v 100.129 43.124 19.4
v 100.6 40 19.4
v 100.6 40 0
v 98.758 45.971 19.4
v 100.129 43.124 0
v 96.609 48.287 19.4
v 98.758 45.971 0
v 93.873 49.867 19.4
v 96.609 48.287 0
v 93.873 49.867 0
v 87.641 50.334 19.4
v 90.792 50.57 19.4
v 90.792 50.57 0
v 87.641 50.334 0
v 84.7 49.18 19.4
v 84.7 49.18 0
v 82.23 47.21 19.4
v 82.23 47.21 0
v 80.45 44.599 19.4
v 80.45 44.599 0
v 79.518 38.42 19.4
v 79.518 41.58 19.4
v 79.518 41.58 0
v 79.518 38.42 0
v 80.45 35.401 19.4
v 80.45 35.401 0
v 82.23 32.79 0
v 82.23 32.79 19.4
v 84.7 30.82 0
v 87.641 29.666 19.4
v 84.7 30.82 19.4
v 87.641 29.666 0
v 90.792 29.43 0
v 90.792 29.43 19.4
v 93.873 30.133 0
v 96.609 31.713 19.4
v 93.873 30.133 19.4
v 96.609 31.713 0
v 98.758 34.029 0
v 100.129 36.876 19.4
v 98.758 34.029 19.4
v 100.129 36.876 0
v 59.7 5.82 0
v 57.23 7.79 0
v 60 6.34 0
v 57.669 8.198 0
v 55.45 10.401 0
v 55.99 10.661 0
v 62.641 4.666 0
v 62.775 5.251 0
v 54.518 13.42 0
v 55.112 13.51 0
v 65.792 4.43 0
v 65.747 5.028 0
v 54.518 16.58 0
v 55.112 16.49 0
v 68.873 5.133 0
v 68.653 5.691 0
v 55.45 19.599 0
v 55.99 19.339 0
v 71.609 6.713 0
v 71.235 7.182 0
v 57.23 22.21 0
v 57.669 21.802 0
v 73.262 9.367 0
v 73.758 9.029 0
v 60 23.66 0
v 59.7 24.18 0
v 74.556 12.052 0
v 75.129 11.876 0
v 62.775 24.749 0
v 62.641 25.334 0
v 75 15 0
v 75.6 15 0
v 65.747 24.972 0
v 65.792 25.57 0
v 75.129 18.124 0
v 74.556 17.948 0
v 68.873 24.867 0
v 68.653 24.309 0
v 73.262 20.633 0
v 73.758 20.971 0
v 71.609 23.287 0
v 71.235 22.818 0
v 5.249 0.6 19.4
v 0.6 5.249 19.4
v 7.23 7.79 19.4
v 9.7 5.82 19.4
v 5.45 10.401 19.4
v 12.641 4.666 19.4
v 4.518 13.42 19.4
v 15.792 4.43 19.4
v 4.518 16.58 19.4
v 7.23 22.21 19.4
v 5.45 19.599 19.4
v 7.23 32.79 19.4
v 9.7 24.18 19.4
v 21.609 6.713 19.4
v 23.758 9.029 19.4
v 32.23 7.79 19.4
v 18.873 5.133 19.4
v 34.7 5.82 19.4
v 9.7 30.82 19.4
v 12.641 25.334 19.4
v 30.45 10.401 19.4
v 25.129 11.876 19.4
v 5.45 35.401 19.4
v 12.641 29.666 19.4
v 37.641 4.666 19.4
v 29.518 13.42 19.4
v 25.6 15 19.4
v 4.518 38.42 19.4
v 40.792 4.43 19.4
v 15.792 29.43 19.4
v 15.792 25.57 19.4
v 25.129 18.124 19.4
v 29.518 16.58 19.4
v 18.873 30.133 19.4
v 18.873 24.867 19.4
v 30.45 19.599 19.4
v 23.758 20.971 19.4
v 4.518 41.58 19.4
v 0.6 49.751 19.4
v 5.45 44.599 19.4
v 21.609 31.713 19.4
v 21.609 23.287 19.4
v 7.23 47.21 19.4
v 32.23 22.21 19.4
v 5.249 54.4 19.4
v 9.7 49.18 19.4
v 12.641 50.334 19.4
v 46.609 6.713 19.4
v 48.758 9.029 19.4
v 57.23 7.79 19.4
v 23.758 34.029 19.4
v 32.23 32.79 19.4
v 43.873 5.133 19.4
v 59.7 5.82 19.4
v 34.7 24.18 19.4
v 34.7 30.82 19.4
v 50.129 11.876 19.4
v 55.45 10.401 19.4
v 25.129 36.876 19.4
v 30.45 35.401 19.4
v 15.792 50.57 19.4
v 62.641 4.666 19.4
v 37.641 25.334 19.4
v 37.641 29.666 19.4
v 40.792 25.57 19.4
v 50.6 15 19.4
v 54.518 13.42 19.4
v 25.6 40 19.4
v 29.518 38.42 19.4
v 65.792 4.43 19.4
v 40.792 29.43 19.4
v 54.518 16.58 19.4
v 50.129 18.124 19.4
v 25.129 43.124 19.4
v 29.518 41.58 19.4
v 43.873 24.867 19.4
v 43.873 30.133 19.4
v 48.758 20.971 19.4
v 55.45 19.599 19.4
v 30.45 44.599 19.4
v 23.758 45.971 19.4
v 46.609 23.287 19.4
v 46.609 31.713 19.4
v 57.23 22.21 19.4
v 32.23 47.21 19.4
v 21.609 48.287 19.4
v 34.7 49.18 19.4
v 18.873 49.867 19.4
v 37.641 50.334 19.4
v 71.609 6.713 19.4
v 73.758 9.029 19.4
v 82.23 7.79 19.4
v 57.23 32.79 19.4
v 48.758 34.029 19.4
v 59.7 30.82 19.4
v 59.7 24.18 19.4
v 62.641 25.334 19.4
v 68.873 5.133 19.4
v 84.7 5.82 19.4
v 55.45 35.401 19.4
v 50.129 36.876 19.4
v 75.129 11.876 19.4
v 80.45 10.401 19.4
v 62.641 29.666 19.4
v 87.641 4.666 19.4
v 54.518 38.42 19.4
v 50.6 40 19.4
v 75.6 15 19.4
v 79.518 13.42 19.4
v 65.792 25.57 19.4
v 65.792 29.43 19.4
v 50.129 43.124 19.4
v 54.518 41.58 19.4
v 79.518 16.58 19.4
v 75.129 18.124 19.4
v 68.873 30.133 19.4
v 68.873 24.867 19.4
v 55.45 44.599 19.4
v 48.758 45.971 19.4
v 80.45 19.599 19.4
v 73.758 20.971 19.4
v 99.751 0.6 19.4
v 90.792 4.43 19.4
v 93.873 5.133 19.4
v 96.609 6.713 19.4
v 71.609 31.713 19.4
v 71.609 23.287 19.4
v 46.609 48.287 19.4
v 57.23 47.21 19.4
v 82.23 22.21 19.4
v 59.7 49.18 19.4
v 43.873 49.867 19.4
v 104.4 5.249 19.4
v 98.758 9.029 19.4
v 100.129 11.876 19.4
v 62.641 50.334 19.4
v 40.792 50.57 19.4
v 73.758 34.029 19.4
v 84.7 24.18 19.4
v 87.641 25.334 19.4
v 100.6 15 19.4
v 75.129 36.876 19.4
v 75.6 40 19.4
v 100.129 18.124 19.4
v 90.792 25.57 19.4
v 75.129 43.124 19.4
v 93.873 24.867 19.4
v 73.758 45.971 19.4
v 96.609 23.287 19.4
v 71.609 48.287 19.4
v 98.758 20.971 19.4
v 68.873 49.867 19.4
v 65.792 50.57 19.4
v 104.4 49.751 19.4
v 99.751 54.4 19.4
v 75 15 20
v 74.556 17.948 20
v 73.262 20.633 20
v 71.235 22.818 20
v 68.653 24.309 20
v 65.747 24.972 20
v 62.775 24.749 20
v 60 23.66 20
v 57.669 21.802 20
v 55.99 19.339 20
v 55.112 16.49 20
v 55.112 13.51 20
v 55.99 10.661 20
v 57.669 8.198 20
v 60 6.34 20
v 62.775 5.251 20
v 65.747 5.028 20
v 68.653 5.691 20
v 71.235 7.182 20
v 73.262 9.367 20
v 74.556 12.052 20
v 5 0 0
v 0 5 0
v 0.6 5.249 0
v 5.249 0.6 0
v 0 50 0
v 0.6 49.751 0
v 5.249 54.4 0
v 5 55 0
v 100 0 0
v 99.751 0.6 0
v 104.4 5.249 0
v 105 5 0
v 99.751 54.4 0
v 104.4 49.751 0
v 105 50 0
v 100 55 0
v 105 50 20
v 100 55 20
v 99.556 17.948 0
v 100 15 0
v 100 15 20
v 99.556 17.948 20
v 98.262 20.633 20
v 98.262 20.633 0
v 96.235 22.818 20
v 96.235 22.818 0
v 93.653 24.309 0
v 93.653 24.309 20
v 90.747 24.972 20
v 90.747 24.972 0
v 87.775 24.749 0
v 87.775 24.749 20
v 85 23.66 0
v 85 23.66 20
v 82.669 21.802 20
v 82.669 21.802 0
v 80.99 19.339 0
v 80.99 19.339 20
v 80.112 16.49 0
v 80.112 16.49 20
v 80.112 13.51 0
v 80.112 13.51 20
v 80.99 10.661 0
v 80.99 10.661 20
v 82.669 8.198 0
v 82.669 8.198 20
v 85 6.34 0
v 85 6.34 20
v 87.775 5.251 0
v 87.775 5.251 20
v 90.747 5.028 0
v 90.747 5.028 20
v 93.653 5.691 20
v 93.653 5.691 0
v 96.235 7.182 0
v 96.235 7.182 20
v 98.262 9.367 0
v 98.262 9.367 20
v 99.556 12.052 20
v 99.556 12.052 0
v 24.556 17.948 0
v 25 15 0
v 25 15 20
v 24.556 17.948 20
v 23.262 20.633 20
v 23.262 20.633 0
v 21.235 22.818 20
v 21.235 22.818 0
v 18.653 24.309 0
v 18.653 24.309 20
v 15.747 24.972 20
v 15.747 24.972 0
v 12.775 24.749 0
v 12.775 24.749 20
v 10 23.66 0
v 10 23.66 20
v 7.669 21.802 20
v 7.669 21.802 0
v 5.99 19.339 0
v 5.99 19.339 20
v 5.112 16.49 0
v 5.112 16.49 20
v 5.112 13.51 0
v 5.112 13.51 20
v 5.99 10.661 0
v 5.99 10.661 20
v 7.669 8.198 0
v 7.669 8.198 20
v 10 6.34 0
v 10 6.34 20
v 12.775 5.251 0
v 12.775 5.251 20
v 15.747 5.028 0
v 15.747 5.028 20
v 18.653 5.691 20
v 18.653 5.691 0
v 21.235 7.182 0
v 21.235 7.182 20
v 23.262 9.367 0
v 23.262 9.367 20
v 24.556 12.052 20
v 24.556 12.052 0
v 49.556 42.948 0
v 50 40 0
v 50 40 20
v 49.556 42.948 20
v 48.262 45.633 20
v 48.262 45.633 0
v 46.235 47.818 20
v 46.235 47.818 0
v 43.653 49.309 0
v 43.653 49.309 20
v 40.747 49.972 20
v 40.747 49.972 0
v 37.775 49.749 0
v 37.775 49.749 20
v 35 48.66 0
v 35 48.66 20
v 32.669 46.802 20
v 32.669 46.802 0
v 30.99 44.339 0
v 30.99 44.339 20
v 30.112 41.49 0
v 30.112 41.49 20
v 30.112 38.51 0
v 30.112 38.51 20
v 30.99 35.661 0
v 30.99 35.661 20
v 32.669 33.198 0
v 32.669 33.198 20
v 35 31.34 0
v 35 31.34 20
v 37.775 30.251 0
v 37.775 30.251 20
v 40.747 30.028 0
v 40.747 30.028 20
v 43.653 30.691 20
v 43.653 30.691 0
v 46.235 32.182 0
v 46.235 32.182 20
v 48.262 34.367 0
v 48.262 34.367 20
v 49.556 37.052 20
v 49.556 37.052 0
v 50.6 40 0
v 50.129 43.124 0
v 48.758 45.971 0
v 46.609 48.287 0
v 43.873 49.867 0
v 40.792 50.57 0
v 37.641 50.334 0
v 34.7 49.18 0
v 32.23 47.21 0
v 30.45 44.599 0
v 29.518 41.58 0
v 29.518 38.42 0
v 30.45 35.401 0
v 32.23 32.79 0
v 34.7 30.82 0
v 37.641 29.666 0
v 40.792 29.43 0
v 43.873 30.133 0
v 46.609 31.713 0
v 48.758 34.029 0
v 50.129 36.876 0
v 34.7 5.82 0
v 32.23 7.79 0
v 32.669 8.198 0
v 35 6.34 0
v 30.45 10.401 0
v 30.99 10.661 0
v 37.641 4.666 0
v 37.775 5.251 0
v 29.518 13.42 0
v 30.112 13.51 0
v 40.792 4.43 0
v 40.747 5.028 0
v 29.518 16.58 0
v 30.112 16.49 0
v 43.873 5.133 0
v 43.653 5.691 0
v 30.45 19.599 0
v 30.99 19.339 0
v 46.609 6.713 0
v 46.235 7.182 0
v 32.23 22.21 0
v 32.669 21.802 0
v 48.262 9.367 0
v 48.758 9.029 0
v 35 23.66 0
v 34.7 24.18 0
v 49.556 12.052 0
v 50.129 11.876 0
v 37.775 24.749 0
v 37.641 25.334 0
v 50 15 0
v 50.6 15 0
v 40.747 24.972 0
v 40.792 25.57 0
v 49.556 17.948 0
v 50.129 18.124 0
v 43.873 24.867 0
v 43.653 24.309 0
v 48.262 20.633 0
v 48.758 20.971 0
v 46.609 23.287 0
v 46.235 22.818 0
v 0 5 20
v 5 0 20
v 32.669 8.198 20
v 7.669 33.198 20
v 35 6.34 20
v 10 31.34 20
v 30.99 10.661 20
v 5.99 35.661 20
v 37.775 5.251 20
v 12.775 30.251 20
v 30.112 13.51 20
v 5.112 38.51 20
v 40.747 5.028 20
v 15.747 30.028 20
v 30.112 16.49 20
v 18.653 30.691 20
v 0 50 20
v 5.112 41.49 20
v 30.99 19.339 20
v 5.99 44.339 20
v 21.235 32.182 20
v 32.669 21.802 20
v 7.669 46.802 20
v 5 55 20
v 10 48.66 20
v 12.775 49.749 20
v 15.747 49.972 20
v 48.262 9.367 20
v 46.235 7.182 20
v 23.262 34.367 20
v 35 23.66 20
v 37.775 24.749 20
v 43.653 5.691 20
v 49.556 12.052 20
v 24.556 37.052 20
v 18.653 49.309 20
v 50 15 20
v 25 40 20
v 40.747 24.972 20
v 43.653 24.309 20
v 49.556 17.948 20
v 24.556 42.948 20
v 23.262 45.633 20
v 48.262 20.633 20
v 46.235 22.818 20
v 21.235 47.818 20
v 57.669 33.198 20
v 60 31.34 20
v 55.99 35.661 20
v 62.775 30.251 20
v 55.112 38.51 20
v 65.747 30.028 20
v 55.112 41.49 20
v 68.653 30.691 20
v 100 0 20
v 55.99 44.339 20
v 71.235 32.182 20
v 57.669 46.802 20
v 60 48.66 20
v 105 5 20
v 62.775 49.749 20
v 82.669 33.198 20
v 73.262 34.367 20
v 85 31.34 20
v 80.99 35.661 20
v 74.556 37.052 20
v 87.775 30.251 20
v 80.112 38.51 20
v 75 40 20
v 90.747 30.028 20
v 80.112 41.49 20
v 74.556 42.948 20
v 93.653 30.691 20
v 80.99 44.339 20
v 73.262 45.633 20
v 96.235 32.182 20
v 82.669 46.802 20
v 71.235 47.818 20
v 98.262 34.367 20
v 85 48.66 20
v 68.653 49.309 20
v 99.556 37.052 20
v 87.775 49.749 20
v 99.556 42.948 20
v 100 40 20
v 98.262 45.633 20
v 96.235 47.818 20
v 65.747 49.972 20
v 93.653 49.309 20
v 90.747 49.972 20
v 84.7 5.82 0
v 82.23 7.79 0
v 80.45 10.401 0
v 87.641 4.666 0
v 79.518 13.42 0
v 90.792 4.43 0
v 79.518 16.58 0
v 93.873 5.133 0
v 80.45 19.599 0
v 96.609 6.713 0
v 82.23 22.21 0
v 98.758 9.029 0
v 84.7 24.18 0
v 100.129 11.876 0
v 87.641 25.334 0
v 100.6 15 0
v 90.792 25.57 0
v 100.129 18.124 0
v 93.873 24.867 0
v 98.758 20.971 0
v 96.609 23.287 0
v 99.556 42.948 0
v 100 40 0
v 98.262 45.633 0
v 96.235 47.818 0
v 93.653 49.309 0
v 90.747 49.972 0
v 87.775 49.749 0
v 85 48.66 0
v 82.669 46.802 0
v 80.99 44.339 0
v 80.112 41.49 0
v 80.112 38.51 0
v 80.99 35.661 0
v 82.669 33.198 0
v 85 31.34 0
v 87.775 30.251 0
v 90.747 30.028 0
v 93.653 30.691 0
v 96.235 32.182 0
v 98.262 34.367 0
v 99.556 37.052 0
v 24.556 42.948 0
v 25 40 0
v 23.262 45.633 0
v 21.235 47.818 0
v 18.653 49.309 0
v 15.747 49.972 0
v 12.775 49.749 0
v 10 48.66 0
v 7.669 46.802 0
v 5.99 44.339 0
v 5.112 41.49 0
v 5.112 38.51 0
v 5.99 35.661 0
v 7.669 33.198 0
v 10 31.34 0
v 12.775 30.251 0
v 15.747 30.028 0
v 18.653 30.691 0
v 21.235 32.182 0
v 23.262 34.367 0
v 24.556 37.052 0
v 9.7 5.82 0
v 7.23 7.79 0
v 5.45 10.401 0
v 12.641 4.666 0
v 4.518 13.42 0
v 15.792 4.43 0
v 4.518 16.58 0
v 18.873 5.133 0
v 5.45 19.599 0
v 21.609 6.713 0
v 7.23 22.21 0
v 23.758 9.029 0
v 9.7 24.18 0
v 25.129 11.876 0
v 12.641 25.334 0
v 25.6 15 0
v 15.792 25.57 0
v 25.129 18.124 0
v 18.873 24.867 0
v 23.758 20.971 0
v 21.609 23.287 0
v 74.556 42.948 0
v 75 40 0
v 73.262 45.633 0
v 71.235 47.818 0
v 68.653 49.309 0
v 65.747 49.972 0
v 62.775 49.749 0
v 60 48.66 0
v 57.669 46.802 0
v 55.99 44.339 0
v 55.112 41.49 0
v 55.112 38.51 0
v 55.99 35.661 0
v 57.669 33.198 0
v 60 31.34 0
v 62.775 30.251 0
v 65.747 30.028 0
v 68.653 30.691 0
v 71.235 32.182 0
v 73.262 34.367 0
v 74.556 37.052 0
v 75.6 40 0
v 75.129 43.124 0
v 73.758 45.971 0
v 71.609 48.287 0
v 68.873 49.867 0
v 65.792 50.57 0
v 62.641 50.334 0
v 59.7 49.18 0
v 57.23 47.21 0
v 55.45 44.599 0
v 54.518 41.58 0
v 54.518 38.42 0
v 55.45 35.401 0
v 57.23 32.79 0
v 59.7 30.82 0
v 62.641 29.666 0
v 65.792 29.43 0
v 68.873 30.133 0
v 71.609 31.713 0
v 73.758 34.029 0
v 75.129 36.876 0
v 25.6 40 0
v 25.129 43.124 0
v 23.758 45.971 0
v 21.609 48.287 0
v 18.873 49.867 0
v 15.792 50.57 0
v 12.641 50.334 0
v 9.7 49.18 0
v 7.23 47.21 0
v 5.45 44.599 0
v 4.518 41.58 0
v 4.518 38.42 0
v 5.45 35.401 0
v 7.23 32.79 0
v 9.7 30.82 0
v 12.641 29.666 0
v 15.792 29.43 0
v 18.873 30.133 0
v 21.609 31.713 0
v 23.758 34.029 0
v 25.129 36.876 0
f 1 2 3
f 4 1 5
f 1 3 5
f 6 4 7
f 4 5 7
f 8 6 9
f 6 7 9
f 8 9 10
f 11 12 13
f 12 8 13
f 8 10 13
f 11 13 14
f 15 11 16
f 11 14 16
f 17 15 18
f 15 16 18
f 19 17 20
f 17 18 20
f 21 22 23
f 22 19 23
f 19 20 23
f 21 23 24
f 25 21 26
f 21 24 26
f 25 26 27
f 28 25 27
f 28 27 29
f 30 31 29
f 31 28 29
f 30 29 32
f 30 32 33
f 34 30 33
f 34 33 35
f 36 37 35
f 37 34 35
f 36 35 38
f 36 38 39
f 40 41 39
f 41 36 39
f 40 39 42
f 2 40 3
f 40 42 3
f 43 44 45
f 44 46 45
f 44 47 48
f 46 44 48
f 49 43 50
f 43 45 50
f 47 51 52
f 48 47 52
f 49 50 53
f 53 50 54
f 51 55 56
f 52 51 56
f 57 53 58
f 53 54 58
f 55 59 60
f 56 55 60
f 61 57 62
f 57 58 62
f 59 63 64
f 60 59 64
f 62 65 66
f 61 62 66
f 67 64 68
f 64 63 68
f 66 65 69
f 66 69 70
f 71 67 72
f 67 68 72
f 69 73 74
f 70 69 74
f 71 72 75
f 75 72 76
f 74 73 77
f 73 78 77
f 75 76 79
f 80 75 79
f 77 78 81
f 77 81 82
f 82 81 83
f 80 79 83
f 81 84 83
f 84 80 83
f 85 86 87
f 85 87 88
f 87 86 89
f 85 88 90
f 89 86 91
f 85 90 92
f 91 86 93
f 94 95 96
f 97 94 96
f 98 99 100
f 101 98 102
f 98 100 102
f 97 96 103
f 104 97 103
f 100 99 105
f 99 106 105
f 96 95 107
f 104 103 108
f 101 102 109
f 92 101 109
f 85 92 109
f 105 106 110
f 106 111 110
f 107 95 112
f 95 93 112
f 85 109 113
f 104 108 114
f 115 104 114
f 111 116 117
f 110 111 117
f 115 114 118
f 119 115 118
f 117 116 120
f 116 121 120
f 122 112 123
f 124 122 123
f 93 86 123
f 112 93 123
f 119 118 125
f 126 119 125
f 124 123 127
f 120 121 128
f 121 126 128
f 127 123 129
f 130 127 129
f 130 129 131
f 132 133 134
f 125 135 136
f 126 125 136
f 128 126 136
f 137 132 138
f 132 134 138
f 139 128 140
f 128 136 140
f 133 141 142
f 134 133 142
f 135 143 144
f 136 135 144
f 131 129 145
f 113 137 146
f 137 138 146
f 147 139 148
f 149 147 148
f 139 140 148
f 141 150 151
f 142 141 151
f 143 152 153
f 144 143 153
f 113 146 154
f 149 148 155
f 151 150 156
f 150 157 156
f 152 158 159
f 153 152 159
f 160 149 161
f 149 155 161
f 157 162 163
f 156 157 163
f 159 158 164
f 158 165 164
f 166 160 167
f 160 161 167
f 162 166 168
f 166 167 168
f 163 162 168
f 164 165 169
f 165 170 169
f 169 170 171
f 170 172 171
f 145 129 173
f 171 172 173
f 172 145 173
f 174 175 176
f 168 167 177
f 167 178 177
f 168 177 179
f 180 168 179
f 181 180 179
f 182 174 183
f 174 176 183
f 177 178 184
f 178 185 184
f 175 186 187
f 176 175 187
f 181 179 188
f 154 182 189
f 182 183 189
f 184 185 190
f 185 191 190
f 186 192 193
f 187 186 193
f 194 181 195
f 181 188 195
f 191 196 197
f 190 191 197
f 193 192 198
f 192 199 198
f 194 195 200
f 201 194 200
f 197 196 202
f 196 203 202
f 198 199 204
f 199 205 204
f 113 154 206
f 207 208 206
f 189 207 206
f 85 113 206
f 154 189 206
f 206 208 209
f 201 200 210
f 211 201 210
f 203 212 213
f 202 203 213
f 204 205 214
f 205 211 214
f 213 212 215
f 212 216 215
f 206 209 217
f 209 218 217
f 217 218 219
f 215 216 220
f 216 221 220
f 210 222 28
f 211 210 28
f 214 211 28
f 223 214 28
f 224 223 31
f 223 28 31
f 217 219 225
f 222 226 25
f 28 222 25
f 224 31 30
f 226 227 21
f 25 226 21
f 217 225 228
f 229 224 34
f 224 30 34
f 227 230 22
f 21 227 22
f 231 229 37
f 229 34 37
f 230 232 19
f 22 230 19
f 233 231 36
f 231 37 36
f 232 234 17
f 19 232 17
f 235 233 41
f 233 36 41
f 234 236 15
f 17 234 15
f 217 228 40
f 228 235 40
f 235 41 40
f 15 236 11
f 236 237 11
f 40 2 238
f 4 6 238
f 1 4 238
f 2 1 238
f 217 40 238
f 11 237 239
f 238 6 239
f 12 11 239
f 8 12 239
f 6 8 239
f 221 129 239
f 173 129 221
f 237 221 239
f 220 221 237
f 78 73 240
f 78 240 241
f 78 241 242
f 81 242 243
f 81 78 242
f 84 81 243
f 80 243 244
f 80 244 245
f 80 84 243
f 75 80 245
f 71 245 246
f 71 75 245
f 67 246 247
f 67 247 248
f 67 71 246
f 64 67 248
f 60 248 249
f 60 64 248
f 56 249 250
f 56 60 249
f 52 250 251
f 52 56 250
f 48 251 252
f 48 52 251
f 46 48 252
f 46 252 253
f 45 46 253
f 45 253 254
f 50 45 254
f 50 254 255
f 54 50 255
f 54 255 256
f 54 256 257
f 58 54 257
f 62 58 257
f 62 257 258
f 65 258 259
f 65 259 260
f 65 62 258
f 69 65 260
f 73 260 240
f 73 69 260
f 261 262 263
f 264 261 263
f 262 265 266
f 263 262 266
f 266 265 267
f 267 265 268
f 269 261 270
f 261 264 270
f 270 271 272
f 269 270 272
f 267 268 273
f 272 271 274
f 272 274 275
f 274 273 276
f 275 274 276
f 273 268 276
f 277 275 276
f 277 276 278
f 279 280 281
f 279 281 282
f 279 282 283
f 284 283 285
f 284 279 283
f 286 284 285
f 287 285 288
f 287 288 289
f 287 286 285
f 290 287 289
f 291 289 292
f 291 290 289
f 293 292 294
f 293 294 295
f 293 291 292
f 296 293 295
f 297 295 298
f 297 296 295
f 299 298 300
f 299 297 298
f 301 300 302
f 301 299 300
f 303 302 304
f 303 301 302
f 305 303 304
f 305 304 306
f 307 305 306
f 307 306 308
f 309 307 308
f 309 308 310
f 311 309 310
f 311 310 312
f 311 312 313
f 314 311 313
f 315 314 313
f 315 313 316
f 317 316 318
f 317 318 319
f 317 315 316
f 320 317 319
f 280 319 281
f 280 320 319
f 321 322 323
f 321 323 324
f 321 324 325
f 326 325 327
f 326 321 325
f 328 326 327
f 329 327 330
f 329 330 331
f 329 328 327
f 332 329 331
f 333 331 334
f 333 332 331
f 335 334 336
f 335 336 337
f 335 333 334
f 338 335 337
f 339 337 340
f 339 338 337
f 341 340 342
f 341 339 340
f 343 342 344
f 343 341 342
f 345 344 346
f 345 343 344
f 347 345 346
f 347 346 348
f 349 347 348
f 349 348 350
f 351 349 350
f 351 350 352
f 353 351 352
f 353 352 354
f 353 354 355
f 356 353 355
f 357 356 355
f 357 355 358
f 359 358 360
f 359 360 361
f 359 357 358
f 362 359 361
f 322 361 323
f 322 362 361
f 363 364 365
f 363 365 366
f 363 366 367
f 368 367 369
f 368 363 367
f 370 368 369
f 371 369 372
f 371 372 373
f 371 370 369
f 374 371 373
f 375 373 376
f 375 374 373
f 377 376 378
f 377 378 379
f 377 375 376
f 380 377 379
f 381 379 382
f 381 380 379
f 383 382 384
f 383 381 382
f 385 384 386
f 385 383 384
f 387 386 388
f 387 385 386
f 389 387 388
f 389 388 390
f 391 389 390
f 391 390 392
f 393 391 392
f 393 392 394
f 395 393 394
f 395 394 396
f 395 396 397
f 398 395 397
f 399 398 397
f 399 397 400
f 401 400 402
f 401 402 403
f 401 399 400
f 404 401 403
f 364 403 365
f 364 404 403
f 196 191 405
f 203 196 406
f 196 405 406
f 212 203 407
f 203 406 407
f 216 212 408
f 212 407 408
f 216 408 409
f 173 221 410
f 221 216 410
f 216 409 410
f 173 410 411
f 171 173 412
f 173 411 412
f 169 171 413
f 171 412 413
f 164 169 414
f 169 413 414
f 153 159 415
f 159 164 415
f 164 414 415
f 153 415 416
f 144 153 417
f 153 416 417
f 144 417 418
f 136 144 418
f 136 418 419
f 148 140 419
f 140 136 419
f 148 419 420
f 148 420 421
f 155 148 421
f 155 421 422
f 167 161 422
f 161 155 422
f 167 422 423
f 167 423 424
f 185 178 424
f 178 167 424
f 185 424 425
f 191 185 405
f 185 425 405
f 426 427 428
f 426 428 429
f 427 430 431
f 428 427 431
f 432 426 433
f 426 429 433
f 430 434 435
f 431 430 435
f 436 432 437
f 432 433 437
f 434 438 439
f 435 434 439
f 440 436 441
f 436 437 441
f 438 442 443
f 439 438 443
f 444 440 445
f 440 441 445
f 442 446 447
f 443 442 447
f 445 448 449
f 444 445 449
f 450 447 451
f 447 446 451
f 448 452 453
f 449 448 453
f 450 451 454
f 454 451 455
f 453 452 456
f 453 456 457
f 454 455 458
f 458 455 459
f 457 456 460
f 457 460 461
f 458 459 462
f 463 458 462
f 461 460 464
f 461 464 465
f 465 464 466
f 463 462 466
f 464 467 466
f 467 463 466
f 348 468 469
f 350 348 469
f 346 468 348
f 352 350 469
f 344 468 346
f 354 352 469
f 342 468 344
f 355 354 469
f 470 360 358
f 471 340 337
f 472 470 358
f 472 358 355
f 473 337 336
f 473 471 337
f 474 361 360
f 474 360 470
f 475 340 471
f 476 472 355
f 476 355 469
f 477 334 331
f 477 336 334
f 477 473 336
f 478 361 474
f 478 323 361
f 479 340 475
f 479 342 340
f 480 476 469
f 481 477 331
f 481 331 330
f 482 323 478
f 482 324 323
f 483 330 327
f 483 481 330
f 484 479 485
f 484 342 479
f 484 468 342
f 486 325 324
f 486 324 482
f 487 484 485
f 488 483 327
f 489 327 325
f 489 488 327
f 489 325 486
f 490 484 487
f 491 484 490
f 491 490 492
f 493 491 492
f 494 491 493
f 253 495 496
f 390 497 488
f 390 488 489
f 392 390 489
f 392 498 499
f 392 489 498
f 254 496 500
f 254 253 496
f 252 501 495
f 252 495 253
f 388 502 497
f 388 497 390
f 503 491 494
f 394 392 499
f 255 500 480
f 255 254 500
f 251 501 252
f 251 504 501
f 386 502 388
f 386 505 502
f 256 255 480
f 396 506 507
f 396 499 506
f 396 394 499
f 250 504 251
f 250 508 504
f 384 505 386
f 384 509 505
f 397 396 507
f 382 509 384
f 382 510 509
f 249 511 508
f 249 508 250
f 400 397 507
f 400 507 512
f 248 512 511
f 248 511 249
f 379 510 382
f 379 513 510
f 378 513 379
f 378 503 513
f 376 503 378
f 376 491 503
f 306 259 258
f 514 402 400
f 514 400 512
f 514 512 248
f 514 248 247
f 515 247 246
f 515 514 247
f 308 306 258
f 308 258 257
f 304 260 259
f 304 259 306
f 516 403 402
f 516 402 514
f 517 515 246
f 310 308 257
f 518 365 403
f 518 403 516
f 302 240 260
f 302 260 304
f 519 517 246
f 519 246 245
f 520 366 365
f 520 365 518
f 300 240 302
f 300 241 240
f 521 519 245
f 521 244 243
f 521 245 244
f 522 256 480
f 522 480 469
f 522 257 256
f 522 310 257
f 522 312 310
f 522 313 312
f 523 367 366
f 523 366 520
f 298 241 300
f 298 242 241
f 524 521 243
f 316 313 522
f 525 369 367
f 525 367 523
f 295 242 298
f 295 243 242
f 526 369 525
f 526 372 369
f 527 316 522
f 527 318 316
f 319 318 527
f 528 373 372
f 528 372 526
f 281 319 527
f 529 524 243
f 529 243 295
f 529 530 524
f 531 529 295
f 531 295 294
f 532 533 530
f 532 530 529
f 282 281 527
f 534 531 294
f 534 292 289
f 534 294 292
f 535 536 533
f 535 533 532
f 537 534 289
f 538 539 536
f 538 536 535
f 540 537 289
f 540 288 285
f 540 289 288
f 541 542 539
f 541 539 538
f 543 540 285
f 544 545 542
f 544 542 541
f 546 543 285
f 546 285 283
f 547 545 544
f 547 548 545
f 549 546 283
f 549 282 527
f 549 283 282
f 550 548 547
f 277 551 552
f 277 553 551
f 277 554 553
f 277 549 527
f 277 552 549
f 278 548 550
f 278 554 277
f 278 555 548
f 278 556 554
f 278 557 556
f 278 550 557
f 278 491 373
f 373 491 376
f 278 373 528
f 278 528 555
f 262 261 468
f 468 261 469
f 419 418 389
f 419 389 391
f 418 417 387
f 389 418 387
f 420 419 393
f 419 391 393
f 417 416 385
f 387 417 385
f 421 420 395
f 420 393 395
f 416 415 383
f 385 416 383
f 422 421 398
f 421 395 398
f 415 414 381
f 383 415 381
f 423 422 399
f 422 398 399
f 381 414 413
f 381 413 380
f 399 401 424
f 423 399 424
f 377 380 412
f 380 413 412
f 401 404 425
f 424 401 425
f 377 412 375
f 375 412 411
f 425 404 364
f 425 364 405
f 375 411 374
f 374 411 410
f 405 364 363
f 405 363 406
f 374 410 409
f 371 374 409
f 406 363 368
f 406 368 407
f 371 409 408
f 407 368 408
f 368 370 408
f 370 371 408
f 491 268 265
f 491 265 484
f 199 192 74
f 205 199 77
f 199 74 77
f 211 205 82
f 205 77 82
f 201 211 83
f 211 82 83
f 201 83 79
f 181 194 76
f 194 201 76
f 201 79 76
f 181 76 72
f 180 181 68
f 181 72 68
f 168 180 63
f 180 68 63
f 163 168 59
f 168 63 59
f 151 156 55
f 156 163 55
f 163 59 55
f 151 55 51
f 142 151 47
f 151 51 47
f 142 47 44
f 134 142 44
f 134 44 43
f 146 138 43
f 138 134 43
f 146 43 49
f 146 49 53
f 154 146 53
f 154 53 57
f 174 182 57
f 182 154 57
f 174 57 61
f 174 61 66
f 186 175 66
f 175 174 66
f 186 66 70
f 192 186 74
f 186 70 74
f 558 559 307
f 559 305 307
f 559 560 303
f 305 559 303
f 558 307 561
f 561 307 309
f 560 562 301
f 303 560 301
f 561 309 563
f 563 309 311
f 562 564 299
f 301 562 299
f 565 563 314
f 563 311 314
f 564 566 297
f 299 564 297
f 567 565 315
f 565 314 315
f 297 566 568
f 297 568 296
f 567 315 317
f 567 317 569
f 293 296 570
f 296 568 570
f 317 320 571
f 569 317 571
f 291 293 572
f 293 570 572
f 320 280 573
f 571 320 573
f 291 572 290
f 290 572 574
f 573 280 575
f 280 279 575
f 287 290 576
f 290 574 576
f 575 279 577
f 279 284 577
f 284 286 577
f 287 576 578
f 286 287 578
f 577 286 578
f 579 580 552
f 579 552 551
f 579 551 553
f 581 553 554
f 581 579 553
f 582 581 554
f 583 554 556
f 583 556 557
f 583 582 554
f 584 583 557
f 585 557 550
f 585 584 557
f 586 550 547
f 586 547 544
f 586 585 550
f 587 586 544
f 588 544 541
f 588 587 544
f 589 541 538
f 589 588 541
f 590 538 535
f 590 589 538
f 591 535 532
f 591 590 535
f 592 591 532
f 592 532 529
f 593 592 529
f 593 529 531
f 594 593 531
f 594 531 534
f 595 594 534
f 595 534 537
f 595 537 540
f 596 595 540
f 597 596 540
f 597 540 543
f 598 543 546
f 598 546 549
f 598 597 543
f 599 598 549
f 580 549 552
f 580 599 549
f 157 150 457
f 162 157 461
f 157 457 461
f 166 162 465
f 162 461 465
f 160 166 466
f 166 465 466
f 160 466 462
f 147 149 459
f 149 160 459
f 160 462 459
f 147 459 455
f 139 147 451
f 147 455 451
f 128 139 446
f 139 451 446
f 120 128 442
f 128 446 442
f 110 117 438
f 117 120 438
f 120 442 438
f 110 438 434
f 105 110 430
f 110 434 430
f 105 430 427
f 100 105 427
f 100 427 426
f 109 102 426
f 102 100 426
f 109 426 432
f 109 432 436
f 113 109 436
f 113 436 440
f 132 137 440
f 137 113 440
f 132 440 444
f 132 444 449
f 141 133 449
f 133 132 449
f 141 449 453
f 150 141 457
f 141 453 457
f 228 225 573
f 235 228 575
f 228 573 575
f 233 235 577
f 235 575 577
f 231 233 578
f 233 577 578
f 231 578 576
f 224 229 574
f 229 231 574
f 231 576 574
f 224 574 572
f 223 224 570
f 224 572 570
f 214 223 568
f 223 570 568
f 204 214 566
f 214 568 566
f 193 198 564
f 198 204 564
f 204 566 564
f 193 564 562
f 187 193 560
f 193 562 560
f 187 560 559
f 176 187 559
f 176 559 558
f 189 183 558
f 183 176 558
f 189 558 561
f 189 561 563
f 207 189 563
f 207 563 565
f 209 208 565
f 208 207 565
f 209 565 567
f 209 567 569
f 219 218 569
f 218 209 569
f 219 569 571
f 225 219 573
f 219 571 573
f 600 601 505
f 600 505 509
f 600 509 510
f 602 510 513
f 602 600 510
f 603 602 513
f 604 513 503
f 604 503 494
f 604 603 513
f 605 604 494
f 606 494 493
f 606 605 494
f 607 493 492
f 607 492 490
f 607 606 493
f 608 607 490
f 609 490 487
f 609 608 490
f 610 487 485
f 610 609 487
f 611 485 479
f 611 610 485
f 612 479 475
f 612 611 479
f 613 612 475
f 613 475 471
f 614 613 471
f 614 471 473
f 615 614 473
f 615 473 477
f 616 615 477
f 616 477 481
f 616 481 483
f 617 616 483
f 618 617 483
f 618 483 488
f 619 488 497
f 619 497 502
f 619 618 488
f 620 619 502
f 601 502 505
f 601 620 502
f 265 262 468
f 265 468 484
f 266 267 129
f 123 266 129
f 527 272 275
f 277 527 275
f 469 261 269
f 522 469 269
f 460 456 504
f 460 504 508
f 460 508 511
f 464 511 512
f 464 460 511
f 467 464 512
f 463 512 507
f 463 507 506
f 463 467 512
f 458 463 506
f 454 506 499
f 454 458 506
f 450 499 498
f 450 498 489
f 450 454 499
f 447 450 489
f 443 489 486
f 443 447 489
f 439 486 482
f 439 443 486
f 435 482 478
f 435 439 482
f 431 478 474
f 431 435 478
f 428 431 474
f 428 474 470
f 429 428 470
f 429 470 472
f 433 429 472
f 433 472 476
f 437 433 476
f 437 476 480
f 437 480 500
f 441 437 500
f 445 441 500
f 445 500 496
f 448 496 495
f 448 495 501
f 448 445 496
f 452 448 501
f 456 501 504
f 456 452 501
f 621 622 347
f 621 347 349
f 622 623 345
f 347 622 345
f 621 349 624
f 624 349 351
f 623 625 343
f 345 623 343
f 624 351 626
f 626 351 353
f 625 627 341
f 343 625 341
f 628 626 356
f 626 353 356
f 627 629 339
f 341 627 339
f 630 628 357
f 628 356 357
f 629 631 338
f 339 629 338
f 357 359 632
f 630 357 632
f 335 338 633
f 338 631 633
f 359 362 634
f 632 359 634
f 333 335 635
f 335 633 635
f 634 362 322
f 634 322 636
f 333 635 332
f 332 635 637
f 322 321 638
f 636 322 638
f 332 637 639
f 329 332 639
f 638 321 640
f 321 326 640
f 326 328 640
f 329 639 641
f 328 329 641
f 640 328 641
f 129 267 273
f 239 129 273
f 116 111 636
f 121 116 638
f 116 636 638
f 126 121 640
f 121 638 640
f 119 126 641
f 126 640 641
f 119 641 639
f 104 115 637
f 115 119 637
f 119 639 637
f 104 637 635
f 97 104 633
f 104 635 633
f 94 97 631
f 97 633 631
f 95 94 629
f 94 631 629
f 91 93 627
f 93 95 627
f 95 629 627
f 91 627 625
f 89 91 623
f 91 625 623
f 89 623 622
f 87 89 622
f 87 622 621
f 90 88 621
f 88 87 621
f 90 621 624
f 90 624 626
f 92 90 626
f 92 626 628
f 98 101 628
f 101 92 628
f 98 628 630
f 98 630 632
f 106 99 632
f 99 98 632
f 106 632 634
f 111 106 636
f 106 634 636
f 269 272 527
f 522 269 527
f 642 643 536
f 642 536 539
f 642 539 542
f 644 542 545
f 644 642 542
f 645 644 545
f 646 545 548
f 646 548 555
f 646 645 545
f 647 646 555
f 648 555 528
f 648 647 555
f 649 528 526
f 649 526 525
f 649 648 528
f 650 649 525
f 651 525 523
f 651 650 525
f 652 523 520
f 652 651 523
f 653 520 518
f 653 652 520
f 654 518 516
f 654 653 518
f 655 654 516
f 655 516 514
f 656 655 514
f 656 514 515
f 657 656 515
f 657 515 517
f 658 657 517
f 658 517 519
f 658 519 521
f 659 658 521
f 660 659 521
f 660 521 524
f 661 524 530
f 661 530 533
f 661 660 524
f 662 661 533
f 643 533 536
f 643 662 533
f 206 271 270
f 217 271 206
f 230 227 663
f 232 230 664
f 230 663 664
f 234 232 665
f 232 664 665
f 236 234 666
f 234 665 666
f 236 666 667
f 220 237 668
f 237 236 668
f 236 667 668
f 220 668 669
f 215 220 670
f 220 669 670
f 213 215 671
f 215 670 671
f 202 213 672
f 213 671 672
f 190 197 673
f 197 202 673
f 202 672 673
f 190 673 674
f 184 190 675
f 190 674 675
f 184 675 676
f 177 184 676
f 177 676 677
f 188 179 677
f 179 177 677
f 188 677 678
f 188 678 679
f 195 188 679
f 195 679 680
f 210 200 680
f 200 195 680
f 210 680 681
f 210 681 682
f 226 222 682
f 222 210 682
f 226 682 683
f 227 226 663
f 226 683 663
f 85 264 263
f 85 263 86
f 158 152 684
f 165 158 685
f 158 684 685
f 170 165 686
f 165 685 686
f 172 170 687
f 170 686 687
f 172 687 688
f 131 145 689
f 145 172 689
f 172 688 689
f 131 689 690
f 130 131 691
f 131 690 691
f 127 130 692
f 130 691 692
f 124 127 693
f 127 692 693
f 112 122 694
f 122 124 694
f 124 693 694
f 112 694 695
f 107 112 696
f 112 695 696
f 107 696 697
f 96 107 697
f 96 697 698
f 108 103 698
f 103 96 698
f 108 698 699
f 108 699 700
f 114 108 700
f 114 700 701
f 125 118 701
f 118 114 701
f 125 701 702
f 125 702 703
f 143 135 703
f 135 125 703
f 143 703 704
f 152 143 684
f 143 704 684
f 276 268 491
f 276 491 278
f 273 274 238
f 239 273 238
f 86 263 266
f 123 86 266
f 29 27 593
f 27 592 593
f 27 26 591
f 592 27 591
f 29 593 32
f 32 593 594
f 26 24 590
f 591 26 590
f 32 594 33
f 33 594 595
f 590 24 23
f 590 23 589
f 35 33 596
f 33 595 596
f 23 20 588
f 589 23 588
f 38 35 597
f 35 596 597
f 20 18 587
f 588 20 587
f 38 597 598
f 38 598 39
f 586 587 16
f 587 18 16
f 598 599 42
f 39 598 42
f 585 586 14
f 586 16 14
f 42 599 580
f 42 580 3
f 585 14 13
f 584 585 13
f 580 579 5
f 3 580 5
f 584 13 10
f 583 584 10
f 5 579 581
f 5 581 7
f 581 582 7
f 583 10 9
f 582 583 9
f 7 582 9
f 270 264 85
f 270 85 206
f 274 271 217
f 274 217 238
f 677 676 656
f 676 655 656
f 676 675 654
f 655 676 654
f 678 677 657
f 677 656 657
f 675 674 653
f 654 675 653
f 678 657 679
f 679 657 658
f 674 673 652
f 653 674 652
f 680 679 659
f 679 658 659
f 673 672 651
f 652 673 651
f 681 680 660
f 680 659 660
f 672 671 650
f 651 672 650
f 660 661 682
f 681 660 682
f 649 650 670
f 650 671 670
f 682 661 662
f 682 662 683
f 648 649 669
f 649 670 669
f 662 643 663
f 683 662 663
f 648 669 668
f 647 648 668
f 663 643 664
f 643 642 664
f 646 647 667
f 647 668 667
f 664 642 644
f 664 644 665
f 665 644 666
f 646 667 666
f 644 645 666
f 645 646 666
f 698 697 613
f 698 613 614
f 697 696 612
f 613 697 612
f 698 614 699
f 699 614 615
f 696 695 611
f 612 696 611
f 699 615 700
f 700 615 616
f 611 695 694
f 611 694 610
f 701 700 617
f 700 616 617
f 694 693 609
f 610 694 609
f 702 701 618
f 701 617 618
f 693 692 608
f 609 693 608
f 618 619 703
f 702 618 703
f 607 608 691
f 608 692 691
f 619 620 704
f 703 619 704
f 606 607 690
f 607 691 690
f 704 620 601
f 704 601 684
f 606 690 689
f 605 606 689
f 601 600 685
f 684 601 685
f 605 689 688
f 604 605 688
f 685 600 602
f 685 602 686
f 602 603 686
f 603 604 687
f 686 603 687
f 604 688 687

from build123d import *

# Parameters (mm, degrees)
F0_W     = 105
F0_H     = 55
F0_R     = 10
F1_DEPTH = 20
F3_SIZE  = 5
F4_T     = -0.6


with BuildPart() as f1:
    # F0 (on Top) → F1 (new body)
    with BuildSketch(Plane.XY):
        with Locations((52.5, 27.5)):
            Rectangle(F0_W, F0_H)
        with Locations((15, 15)):
            Circle(F0_R, mode=Mode.SUBTRACT)
        with Locations((40, 15)):
            Circle(F0_R, mode=Mode.SUBTRACT)
        with Locations((65, 15)):
            Circle(F0_R, mode=Mode.SUBTRACT)
        with Locations((90, 15)):
            Circle(F0_R, mode=Mode.SUBTRACT)
        with Locations((15, 40)):
            Circle(F0_R, mode=Mode.SUBTRACT)
        with Locations((40, 40)):
            Circle(F0_R, mode=Mode.SUBTRACT)
        with Locations((65, 40)):
            Circle(F0_R, mode=Mode.SUBTRACT)
        with Locations((90, 40)):
            Circle(F0_R, mode=Mode.SUBTRACT)
    extrude(amount=F1_DEPTH)

    # F3
    f3_edges = [f1.edges().sort_by_distance(p)[0] for p in [
        (0, 0, 10),
        (105, 0, 10),
        (105, 55, 10),
        (0, 55, 10),
    ]]
    chamfer(f3_edges, length=F3_SIZE)

    # F4
    f4_openings = [f1.faces().sort_by_distance(p)[0] for p in [
        (52.5, 27.5, 0),
    ]]
    offset(amount=F4_T, openings=f4_openings)


solid = f1.part
